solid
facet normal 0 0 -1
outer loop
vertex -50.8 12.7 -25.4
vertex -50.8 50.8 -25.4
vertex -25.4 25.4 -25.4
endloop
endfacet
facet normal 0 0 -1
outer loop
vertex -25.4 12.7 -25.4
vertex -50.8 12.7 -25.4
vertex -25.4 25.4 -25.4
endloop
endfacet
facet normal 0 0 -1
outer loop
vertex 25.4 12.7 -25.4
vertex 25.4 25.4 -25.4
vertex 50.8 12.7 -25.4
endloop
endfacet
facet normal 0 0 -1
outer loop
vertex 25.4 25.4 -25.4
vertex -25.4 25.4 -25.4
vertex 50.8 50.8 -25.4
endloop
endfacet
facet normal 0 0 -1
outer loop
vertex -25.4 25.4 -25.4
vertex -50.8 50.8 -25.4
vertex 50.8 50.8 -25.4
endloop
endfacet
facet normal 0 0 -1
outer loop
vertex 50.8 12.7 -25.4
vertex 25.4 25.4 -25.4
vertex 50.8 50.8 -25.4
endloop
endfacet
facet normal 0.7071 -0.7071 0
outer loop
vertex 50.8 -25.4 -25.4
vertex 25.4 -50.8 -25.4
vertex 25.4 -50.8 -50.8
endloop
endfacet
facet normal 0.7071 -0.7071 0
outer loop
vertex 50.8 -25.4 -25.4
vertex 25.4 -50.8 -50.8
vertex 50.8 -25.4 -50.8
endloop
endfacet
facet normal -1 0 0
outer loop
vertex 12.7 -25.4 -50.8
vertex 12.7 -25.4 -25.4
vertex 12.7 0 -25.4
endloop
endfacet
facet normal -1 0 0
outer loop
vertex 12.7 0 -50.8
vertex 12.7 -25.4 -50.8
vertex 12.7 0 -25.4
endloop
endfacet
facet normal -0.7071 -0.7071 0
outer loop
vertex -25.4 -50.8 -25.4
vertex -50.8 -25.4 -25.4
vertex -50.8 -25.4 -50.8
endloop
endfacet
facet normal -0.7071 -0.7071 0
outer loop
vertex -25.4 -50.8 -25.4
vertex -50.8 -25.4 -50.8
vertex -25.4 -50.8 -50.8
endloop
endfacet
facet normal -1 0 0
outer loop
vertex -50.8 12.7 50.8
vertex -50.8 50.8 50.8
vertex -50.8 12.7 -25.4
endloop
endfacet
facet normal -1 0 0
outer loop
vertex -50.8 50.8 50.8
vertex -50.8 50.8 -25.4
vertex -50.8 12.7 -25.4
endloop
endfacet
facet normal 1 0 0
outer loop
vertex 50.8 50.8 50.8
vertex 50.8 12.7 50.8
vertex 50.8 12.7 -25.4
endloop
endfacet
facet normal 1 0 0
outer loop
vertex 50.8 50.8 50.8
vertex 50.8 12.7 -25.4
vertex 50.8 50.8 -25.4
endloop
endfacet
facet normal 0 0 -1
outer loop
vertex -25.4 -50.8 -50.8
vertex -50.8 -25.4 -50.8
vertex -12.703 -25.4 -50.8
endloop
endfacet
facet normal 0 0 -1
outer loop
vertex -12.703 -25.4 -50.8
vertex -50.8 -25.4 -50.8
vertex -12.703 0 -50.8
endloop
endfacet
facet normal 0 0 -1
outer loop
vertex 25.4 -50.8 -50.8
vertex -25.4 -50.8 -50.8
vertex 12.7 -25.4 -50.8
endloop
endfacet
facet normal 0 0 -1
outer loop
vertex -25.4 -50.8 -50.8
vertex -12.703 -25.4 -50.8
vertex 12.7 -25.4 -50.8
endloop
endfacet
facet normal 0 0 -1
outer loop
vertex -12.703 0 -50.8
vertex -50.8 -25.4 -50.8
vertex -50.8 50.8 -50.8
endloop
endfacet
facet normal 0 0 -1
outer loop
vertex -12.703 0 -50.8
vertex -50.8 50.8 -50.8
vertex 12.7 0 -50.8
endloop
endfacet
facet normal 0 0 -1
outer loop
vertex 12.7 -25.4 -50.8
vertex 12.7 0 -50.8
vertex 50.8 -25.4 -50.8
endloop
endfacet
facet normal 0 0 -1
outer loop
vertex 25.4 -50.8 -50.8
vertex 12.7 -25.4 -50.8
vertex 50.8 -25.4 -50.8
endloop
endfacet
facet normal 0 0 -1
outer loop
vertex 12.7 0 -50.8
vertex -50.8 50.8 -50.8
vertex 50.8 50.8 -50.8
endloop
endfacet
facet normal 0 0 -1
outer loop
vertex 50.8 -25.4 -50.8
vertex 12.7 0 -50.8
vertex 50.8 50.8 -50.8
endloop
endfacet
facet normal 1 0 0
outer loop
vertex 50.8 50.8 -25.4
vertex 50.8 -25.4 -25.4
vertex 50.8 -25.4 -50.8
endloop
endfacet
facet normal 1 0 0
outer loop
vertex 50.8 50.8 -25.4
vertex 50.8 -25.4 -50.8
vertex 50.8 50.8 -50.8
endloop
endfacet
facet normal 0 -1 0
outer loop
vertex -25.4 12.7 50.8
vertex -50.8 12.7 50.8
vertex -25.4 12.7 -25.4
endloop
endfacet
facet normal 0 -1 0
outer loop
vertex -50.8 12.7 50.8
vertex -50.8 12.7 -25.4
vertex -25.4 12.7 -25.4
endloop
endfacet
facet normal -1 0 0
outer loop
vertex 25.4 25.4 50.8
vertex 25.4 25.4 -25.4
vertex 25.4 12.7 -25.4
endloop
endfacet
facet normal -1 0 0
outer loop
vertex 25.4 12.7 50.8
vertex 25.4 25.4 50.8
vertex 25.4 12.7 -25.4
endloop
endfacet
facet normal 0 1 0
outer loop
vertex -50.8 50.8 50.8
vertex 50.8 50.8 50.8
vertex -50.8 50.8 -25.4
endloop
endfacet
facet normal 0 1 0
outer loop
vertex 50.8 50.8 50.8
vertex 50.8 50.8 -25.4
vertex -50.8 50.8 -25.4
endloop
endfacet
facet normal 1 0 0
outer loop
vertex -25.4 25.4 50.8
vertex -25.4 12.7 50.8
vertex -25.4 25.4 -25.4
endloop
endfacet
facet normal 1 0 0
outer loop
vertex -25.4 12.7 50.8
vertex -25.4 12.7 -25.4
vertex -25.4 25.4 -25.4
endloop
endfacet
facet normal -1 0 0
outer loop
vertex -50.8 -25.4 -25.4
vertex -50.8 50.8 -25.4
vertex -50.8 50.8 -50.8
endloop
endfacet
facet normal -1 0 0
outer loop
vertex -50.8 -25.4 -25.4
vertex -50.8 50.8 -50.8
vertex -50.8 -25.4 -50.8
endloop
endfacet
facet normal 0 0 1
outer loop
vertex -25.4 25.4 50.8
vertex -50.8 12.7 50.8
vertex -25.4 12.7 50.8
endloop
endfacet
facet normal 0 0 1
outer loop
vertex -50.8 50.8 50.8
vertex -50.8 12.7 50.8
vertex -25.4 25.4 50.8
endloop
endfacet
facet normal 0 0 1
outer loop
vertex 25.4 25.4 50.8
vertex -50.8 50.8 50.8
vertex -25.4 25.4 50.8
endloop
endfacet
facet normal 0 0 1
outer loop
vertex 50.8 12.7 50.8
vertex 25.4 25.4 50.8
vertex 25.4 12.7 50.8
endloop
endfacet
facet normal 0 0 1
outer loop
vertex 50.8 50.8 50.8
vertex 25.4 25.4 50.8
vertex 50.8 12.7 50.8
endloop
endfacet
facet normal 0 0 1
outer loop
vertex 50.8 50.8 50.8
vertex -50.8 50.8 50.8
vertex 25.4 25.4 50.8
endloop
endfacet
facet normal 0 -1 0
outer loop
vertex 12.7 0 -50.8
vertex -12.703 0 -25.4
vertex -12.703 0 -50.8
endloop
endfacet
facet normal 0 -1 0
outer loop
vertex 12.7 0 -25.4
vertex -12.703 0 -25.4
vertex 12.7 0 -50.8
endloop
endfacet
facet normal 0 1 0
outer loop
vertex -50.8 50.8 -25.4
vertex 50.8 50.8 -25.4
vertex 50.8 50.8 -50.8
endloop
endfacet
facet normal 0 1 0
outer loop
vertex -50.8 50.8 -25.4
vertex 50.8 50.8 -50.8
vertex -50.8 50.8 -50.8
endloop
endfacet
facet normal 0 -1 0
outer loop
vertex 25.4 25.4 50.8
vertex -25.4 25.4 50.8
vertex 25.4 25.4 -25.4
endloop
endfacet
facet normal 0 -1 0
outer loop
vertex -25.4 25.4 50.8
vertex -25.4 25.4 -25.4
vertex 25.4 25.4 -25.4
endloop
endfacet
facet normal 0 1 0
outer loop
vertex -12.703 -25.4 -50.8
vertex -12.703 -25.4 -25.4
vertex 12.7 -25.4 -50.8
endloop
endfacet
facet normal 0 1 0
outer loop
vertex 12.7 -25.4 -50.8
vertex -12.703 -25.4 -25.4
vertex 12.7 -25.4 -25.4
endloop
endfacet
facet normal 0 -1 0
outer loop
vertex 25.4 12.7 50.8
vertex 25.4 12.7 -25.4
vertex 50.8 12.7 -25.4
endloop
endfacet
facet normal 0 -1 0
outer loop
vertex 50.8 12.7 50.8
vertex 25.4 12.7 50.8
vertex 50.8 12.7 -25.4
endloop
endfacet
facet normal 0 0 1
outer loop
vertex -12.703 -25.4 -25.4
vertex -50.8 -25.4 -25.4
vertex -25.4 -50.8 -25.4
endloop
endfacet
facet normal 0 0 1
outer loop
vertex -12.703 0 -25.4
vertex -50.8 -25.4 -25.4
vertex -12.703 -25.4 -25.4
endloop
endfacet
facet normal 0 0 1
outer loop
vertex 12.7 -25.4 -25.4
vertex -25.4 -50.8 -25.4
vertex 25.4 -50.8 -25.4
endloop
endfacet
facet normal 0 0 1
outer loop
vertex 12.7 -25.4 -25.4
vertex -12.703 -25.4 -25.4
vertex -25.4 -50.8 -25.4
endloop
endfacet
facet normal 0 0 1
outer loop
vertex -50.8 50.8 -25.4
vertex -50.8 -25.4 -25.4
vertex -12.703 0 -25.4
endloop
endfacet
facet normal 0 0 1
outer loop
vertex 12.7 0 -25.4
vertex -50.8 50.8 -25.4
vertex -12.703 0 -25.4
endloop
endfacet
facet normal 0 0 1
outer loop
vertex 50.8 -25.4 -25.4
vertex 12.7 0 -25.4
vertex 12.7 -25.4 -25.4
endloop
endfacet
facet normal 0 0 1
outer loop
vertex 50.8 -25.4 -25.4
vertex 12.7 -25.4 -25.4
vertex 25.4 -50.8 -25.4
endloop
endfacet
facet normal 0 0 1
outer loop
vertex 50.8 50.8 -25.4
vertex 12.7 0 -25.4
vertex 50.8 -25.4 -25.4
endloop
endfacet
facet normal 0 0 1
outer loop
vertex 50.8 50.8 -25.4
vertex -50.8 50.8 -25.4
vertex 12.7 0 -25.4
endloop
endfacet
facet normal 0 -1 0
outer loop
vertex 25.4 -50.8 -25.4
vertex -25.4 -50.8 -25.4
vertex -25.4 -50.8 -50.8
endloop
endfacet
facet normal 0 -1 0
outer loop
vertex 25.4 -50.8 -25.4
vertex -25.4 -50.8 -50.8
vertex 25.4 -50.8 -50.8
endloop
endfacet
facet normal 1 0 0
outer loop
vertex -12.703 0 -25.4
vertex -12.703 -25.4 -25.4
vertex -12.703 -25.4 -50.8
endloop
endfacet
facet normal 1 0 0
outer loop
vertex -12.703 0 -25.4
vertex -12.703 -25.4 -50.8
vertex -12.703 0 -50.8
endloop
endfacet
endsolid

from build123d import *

# Parameters (mm, degrees)
F1_DEPTH  = 50.8
F2_DEPTH  = 25.4
F3_W      = 25.40301
F3_H      = 25.4
F4_DEPTH  = 50.8
F4_FACE_W = 25.40301
F4_FACE_H = 25.4
F5_DEPTH  = 67.056
F7_DEPTH  = 25.4
F8_DEPTH  = 50.8


with BuildPart() as f1:
    # F0 (on Top) → F1 (new body)
    with BuildSketch(Plane.XY):
        Polygon((50.8, 50.8), (0, 50.8), (-50.8, 50.8), (-50.8, -25.4), (-25.4, -50.8), (0, -50.8), (25.4, -50.8), (50.8, -25.4), align=None)
    extrude(amount=-F1_DEPTH)

    # F1_face (on face) → F2 (cut)
    with BuildSketch(Plane(origin=(0, 2.822222, 0), x_dir=(1, 0, 0), z_dir=(0, 0, 1))):
        Polygon((50.8, -28.222222), (50.8, 47.977778), (-50.8, 47.977778), (-50.8, -28.222222), (-25.4, -53.622222), (25.4, -53.622222), align=None)
    extrude(amount=-F2_DEPTH, mode=Mode.SUBTRACT)

    # F3 (on Top) → F4 (join)
    with BuildSketch(Plane.XY):
        with Locations((-0.001505, -12.7)):
            Rectangle(F3_W, F3_H)
    extrude(amount=-F4_DEPTH)

    # F4_face (on face) → F5 (cut)
    with BuildSketch(Plane(origin=(-0.001505, -12.7, 0), x_dir=(1, 0, 0), z_dir=(0, 0, 1))):
        Rectangle(F4_FACE_W, F4_FACE_H)
    extrude(amount=-F5_DEPTH, mode=Mode.SUBTRACT)


with BuildPart() as f7:
    # F6 (on Top) → F7 (new body)
    with BuildSketch(Plane.XY):
        Polygon((50.8, 50.8), (0, 50.8), (-50.8, 50.8), (-50.8, 12.7), (-25.4, 12.7), (-25.4, 25.4), (25.4, 25.4), (25.4, 12.7), (50.8, 12.7), align=None)
    extrude(amount=-F7_DEPTH)

    # F7_face (on face) → F8 (join)
    with BuildSketch(Plane(origin=(0, 34.29, 0), x_dir=(1, 0, 0), z_dir=(0, 0, 1))):
        Polygon((50.8, -21.59), (50.8, 16.51), (-50.8, 16.51), (-50.8, -21.59), (-25.4, -21.59), (-25.4, -8.89), (25.4, -8.89), (25.4, -21.59), align=None)
    extrude(amount=F8_DEPTH)


solid = Compound([f1.part, f7.part])
